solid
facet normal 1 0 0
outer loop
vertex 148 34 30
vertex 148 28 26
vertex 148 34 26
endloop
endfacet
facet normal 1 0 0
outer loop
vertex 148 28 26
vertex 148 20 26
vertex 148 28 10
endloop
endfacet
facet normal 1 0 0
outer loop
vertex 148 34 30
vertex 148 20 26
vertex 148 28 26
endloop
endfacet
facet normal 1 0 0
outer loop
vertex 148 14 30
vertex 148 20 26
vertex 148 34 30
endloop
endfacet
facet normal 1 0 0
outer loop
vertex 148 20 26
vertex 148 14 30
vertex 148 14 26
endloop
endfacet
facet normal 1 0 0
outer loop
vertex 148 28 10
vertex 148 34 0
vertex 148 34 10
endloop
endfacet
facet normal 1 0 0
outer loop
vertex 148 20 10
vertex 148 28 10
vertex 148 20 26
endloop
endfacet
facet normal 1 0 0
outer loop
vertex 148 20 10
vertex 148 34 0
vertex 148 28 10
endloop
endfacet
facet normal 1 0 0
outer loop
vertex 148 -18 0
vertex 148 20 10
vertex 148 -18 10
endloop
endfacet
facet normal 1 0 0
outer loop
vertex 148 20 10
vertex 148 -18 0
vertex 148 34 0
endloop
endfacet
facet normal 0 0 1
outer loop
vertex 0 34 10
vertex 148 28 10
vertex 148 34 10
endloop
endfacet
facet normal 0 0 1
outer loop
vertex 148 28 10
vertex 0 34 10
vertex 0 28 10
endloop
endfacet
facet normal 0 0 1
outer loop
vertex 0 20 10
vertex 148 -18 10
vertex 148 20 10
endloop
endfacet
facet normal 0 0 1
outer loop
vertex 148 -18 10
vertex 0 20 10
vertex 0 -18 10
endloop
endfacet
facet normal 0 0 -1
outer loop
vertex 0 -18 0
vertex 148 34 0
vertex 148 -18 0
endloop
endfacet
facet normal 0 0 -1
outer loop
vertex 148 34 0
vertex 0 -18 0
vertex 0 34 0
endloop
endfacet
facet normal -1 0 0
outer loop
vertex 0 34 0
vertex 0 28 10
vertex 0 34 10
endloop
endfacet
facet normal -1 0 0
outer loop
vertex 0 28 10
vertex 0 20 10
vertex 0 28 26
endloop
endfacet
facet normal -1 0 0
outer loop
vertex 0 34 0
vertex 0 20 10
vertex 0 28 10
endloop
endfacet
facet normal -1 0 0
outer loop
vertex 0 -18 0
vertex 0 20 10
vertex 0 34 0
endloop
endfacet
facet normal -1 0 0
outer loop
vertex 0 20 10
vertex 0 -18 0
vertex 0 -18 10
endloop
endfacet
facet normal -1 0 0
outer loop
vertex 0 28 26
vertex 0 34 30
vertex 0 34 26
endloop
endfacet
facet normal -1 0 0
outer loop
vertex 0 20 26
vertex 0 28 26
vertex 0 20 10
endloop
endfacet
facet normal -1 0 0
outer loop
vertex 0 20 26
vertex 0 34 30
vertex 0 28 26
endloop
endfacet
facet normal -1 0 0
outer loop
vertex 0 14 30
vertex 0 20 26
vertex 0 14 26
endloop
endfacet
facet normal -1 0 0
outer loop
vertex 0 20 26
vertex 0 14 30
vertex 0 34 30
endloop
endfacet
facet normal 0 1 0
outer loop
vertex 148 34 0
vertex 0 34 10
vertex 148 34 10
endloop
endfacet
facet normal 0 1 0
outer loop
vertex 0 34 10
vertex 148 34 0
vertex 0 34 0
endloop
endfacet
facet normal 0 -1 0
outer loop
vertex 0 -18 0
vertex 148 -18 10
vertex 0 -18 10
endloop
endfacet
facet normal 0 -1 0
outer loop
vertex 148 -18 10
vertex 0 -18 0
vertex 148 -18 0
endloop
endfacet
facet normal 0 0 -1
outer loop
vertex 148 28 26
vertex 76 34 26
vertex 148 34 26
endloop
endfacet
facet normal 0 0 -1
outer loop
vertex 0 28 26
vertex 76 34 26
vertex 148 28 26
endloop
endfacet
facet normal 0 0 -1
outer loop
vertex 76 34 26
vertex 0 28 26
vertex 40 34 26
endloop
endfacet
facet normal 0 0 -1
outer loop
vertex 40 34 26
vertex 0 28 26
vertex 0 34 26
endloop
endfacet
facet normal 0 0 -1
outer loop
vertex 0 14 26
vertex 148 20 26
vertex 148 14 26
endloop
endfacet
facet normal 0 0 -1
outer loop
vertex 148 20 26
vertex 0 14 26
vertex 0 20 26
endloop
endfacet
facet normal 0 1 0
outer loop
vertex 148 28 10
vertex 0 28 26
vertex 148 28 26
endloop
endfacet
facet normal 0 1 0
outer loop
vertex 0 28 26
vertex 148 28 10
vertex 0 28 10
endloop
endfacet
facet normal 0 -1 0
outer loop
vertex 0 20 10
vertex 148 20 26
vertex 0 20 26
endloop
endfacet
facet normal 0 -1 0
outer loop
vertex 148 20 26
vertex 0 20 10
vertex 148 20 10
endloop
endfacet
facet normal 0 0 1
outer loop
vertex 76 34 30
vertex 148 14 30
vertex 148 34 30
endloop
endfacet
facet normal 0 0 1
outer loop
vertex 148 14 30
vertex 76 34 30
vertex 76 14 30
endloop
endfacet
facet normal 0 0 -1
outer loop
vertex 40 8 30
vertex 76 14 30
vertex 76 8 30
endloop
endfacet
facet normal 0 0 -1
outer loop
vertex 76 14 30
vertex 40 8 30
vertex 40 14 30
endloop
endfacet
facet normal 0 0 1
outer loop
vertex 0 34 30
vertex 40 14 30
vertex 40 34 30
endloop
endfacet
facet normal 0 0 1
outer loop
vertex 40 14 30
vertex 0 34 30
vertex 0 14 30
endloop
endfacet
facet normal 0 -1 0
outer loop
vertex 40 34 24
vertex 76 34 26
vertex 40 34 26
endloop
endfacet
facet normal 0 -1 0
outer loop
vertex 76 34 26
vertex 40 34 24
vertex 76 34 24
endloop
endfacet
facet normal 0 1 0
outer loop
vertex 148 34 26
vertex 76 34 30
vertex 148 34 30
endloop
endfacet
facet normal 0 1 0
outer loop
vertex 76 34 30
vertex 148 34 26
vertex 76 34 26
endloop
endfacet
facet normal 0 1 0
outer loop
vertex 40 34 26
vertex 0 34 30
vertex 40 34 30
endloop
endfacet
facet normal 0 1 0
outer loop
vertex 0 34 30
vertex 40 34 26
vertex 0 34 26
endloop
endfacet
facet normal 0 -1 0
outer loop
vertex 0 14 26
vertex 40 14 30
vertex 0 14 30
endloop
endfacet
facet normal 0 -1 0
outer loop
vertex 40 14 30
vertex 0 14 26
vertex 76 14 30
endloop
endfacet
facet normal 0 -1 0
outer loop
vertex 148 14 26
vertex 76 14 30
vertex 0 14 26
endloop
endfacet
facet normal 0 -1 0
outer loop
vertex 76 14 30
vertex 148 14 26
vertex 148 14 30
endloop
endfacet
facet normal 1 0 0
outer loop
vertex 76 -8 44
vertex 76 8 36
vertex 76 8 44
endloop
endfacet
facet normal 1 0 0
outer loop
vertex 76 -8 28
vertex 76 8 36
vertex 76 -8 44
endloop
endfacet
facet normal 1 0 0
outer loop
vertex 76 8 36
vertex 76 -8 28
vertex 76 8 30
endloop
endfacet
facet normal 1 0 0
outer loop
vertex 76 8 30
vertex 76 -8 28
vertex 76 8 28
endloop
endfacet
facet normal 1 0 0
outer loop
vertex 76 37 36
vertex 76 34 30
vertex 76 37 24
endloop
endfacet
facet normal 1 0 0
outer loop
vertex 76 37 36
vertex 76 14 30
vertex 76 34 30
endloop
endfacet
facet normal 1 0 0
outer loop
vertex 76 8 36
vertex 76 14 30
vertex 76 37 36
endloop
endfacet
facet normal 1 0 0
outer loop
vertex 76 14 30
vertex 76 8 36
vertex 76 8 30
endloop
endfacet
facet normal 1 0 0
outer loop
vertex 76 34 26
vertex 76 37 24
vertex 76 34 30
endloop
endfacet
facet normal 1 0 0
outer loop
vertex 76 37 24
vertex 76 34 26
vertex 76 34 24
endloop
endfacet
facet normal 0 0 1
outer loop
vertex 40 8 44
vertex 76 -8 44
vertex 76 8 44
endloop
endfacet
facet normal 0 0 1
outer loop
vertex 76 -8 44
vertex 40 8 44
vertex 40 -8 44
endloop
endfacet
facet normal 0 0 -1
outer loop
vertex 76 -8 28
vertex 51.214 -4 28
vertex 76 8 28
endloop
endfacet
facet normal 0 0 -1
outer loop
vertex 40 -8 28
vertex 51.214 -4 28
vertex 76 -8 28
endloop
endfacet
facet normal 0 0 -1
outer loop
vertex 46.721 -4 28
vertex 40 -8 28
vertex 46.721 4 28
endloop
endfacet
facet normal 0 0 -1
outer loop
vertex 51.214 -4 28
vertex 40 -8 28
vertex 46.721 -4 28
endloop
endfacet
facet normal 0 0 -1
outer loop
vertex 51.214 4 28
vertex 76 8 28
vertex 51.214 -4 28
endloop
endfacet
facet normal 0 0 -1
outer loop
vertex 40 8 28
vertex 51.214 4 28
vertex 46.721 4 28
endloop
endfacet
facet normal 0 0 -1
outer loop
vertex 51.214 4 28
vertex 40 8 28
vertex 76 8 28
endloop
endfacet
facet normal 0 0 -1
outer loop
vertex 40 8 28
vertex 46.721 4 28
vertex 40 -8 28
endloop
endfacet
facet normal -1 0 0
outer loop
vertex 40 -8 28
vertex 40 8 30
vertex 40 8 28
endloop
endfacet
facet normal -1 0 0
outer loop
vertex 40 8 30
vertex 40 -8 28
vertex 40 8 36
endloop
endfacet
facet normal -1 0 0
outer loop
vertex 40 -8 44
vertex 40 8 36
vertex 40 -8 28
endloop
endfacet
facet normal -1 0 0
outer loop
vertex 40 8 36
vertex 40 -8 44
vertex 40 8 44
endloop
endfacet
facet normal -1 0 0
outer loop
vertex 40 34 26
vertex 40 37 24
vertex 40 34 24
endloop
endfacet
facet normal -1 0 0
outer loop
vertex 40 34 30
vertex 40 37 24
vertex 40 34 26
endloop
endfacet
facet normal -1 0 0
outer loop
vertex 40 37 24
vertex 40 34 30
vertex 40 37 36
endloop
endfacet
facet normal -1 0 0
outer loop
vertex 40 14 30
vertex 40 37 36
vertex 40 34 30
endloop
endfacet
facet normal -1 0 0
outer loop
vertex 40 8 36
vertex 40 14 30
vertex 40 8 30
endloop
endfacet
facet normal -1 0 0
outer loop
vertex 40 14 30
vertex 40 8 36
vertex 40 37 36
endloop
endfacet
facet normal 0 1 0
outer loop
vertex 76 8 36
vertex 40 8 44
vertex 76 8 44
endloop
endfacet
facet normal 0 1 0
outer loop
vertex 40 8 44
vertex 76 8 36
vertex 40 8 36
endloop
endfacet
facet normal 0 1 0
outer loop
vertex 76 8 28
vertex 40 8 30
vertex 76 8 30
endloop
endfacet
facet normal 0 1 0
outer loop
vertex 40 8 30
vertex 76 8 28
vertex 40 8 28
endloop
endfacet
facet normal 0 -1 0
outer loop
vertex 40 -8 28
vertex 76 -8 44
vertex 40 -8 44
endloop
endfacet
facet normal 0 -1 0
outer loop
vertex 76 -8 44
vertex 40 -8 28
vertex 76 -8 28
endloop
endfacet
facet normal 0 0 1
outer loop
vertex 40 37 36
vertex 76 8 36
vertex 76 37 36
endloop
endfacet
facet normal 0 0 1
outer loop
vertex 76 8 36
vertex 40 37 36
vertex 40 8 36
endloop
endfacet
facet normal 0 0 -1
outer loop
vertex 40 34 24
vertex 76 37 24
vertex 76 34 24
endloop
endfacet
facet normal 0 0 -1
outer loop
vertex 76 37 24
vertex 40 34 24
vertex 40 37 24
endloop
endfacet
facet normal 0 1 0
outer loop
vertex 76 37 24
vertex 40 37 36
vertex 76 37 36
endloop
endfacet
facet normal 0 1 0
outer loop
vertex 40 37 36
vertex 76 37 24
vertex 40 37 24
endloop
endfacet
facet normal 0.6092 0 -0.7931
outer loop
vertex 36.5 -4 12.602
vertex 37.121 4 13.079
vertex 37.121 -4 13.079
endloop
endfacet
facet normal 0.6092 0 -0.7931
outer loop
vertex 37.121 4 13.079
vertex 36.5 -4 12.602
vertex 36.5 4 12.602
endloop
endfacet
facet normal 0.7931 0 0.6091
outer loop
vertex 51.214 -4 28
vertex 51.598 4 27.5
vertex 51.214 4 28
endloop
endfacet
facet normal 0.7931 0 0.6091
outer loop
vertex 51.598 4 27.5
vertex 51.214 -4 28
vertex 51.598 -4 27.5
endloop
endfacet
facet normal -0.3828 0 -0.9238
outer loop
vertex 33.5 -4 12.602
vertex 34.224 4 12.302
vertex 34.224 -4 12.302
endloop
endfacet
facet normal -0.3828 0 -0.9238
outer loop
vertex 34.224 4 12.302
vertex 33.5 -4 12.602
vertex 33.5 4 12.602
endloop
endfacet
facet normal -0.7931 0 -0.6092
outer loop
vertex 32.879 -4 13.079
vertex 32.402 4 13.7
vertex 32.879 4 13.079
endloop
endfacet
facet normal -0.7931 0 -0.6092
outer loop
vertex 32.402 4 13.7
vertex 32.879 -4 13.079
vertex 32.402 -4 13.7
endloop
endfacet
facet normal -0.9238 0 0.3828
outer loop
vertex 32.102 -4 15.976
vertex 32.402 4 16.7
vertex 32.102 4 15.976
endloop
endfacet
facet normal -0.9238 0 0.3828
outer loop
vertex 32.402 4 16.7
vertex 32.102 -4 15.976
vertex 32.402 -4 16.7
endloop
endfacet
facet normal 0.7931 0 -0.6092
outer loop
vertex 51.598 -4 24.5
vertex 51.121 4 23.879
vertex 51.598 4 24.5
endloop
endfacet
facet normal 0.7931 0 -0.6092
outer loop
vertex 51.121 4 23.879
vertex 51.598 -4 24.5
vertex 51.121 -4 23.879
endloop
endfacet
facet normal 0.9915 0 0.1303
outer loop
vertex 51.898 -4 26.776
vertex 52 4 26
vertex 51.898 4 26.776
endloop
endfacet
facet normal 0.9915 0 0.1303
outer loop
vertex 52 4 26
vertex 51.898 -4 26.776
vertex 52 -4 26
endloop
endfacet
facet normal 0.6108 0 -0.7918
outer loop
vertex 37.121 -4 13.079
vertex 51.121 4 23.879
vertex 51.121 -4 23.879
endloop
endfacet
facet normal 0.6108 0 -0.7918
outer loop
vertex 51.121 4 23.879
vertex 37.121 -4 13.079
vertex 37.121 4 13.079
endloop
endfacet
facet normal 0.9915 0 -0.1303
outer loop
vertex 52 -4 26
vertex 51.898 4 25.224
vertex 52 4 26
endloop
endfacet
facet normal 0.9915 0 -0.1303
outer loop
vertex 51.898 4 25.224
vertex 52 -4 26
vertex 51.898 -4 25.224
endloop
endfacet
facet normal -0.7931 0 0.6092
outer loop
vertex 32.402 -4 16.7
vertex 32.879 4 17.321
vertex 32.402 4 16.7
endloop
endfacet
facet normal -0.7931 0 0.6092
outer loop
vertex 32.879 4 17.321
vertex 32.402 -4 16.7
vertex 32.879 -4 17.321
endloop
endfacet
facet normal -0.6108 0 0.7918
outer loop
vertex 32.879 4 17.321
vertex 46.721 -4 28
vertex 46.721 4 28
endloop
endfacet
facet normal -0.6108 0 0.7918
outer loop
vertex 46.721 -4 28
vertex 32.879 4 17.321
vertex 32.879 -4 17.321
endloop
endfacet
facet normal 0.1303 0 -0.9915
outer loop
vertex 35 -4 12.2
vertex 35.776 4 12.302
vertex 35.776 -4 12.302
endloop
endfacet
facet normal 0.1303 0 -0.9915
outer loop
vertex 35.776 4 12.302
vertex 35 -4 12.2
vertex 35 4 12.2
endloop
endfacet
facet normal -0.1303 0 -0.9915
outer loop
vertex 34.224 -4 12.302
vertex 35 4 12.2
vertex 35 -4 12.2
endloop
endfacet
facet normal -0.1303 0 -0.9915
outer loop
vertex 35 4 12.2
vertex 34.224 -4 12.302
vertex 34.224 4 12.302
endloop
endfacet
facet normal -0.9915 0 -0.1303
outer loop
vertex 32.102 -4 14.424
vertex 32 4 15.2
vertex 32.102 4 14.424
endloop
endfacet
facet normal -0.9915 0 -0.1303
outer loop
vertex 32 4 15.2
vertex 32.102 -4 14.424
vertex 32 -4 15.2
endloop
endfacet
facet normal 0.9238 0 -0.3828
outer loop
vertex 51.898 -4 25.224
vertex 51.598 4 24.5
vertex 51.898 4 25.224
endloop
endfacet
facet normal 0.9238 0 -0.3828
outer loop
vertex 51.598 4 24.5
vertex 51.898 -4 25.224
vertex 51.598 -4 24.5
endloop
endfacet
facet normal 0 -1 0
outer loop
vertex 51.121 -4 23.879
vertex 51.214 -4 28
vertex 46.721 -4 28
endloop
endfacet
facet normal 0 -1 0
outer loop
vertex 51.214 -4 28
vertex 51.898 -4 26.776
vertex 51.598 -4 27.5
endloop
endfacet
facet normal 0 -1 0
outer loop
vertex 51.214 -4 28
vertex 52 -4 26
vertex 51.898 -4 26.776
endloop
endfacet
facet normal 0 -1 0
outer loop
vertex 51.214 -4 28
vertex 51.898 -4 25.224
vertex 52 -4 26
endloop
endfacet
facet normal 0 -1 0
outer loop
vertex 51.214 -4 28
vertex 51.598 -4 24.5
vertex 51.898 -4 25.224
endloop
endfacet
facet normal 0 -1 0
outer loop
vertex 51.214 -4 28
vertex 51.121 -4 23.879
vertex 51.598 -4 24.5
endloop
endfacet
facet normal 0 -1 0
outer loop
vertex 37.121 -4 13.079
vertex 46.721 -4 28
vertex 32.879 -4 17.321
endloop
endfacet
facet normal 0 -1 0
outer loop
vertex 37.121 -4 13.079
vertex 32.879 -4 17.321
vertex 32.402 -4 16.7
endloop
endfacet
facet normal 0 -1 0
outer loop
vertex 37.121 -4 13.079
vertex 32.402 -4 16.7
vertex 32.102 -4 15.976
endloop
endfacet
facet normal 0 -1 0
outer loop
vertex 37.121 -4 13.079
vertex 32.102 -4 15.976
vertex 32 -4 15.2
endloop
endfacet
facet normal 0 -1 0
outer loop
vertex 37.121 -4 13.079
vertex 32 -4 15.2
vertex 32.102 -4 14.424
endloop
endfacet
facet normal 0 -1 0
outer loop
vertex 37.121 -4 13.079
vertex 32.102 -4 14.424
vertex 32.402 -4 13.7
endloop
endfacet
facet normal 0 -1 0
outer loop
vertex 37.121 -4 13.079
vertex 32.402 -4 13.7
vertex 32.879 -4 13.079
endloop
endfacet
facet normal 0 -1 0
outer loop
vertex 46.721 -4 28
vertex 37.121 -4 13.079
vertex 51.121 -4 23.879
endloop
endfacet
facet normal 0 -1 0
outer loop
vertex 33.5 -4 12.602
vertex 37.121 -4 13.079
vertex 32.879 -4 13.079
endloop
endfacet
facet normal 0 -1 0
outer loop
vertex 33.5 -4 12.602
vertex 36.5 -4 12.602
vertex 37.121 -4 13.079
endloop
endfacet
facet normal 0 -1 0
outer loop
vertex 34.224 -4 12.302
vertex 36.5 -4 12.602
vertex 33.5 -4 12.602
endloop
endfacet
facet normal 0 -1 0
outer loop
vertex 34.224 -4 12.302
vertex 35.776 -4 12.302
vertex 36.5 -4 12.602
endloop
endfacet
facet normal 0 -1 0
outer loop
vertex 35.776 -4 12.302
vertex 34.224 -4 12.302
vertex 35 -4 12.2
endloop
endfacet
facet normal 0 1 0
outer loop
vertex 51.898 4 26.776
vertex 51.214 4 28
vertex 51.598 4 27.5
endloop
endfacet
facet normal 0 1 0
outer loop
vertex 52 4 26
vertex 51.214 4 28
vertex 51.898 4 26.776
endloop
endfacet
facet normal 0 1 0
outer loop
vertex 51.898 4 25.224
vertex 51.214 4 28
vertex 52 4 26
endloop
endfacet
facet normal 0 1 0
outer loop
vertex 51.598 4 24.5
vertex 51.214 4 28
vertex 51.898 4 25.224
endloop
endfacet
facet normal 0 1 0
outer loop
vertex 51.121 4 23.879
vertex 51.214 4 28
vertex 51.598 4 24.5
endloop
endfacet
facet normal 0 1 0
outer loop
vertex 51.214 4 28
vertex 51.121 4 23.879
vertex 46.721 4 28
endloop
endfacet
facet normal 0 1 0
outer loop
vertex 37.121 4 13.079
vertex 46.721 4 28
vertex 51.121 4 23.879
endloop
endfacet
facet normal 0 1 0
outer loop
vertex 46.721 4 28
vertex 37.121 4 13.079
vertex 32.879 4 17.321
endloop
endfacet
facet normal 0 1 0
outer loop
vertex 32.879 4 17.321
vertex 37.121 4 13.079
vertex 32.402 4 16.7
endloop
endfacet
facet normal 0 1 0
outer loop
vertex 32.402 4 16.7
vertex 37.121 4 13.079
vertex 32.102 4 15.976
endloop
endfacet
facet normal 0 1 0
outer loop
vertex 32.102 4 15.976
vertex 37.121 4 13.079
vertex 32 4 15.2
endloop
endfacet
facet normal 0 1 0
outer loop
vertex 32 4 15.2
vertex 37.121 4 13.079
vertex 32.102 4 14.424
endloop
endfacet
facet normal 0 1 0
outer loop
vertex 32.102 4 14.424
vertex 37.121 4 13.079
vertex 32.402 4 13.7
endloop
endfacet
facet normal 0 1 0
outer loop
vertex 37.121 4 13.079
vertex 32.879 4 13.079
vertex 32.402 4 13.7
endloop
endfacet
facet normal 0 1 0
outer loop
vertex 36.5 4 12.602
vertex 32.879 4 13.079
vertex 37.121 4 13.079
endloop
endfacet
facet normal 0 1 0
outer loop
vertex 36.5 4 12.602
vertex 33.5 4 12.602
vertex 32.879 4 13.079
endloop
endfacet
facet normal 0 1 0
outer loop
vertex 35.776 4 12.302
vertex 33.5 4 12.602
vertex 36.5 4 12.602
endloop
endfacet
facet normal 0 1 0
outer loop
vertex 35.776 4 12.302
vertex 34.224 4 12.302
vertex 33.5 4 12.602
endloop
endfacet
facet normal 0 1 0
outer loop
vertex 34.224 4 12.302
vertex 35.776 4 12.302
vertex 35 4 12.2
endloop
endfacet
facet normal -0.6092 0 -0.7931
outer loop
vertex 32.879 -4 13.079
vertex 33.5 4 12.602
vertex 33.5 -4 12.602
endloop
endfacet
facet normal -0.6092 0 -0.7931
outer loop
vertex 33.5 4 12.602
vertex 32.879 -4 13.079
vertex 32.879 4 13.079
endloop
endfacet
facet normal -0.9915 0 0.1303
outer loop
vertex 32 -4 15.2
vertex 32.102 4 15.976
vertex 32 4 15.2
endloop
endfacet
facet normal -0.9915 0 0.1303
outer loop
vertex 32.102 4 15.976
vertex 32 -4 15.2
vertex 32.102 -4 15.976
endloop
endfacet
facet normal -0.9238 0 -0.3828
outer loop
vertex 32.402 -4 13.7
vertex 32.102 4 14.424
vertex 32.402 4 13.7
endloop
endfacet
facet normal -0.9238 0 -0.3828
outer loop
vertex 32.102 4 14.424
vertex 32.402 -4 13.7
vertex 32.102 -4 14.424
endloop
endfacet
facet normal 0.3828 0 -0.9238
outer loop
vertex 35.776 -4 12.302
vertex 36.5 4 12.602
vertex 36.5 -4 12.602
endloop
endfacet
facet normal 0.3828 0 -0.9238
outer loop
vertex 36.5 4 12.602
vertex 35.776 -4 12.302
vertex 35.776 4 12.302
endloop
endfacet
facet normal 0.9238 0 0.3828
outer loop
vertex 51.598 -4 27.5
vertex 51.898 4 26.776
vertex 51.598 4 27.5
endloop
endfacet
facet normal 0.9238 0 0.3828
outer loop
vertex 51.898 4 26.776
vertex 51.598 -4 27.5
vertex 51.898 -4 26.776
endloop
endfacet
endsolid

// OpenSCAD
// A ratchet: free one way, locked the other.
//
// No joint in this model knows about "one way". The carriage is on an ordinary
// slider and the pawl is on an ordinary hinge, and the direction comes entirely
// out of a tooth shape — a shallow ramp the pawl can ride up, and a face it
// cannot. The carriage is driven forward and goes; it is then driven back, with
// the same force and the same distance asked for, and does not move. Nothing
// had to be told to stop it.
//
// The teeth belong to the frame, which is what makes this cheap. A *fixed* part
// keeps every triangle it was drawn with, so the teeth are exactly the teeth. A
// moving toothed part could not: the convex hull of a ratchet wheel is a plain
// disc, and the teeth — the whole mechanism — are exactly the concavities a
// hull fills in. That is what `collider = "decompose"` is for, and it is worth
// knowing what it costs before reaching for it: a voxel decomposition returns a
// collider about one voxel *larger* than the part it came from. The rotary
// version of this model was drawn with the pawl 0.8 mm clear of the wheel, and
// the check said "wheel into pawl by 2.069" before anything was simulated.

module part(name, fixed = false, density = undef, mass = undef,
            collider = undef, friction = undef, bounce = undef) { children(); }
module hinge(name, parts, at, axis, range) { }
module slider(name, parts, at, axis, range) { }
module drive(name, to, over, at, torque, speed) { }

PLASTIC = 0.0012;
PIN     = [0, 1, 0];

DECK  = 10;              // top of the base, and the floor of every valley
PITCH = 12;
TALL  = 6;               // how far a tooth stands above the valley
FIRST = 9.6;             // where the toothed section starts
LEAN  = 3.05;            // how far a tooth's face leans back over its height
TEETH = 10;

// The rail the carriage runs on: a stalk down the back of the deck with a head
// on top, and the carriage wrapping that head. Behind the teeth and above them,
// so it carries the carriage without standing between the teeth and the camera.
STALK = [20, 28];        // the stalk's near and far faces in y
HEAD  = [14, 34];        // the head's, overhanging the stalk both ways
RAIL_Z = 26;             // the underside of the head

P    = [49, 0, RAIL_Z];  // the pawl's pivot, carried by the carriage
NOSE = [35, 0, 15.2];    // and its nose, sitting in a valley

// A saw tooth: a ramp up towards +x, then a face back down. Which of the two
// is the ramp is the entire mechanism.
//
// The face leans back, 3 over 6, and the teeth start where they do, for one
// reason: the nose has to be able to *fall in*. It swings on an arc about the
// pivot, and dropping from a crest it passes the tip of the tooth it is
// dropping behind. With the face straight up, that tip stood a millimetre
// inside the arc the nose sweeps, so the nose came to rest perched on it,
// lifted 14°, and the first pull back slid it a whole tooth before it caught.
// Leant back, the tip is clear of the arc and the nose lands 0.6 from the face.
// It still locks: a push on a face leaning 27° turns the pawl down onto its
// stop as long as the lean is under 37°, which is where a pawl this shape
// would start being lifted out instead.
module rack() {
    translate([0, 9, 0]) rotate([90, 0, 0])
        linear_extrude(height = 18)
            for (i = [0 : TEETH - 1])
                polygon([[FIRST + i * PITCH, DECK],
                         [FIRST + (i + 1) * PITCH - LEAN, DECK + TALL],
                         [FIRST + (i + 1) * PITCH, DECK]]);
}

// Exact, because it never moves. `collider = "mesh"` is already the default for
// a fixed part; it is written out here because it is the point.
part("frame", fixed = true, collider = "mesh", friction = 0.2)
    color("slategray") {
        translate([0, -18, 0]) cube([148, 36 + HEAD[1] - 18, DECK]);
        rack();
        // The rail: the stalk, and the head on top of it.
        translate([0, STALK[0], DECK]) cube([148, STALK[1] - STALK[0], RAIL_Z - DECK]);
        translate([0, HEAD[0], RAIL_Z]) cube([148, HEAD[1] - HEAD[0], 4]);
    }

// The block over the teeth that carries the pawl, an arm back over the rail's
// head resting on it, and a lip down the back of the head, so it wraps it.
part("carriage", density = PLASTIC, friction = 0.2)
    color("steelblue") translate([40, 0, 0]) {
        translate([0, -8, 28]) cube([36, 16, 16]);
        translate([0, 8, RAIL_Z + 4]) cube([36, HEAD[1] - 8, 6]);
        translate([0, HEAD[1], RAIL_Z - 2]) cube([36, 3, 12]);
    }
slider("feed", parts = ["carriage", "frame"], at = [40, 0, 28],
       axis = [1, 0, 0], range = [-4, 64]);

module bar(p, q, r, t) {
    hull() {
        translate(p) rotate([-90, 0, 0]) cylinder(h = t, r = r, $fn = 24, center = true);
        translate(q) rotate([-90, 0, 0]) cylinder(h = t, r = r, $fn = 24, center = true);
    }
}

// Hung off the carriage rather than off the frame, so it travels with it.
part("pawl", density = PLASTIC, friction = 0.2, bounce = 0)
    color("goldenrod") bar(P, NOSE, 3, 8);
// It may lift, and it may not drop below where it is drawn. That stop is what a
// tooth face pushes against on the way back, and it is the whole of the lock.
hinge("pawl_pivot", parts = ["pawl", "carriage"], at = P, axis = PIN,
      range = [0, 30]);
// The spring: enough to drop the nose into the next valley, not enough to stop
// a ramp lifting it out of the last one.
drive("pawl_pivot", to = 0, over = 0.2, at = 0, torque = 200000);

// Forward, then back — the same mate, the same force, the same 60 mm asked for.
drive("feed", to = 60, over = 1.8, at = 0.3, torque = 2000000);
drive("feed", to = 0,  over = 1.5, at = 2.6, torque = 2000000);
